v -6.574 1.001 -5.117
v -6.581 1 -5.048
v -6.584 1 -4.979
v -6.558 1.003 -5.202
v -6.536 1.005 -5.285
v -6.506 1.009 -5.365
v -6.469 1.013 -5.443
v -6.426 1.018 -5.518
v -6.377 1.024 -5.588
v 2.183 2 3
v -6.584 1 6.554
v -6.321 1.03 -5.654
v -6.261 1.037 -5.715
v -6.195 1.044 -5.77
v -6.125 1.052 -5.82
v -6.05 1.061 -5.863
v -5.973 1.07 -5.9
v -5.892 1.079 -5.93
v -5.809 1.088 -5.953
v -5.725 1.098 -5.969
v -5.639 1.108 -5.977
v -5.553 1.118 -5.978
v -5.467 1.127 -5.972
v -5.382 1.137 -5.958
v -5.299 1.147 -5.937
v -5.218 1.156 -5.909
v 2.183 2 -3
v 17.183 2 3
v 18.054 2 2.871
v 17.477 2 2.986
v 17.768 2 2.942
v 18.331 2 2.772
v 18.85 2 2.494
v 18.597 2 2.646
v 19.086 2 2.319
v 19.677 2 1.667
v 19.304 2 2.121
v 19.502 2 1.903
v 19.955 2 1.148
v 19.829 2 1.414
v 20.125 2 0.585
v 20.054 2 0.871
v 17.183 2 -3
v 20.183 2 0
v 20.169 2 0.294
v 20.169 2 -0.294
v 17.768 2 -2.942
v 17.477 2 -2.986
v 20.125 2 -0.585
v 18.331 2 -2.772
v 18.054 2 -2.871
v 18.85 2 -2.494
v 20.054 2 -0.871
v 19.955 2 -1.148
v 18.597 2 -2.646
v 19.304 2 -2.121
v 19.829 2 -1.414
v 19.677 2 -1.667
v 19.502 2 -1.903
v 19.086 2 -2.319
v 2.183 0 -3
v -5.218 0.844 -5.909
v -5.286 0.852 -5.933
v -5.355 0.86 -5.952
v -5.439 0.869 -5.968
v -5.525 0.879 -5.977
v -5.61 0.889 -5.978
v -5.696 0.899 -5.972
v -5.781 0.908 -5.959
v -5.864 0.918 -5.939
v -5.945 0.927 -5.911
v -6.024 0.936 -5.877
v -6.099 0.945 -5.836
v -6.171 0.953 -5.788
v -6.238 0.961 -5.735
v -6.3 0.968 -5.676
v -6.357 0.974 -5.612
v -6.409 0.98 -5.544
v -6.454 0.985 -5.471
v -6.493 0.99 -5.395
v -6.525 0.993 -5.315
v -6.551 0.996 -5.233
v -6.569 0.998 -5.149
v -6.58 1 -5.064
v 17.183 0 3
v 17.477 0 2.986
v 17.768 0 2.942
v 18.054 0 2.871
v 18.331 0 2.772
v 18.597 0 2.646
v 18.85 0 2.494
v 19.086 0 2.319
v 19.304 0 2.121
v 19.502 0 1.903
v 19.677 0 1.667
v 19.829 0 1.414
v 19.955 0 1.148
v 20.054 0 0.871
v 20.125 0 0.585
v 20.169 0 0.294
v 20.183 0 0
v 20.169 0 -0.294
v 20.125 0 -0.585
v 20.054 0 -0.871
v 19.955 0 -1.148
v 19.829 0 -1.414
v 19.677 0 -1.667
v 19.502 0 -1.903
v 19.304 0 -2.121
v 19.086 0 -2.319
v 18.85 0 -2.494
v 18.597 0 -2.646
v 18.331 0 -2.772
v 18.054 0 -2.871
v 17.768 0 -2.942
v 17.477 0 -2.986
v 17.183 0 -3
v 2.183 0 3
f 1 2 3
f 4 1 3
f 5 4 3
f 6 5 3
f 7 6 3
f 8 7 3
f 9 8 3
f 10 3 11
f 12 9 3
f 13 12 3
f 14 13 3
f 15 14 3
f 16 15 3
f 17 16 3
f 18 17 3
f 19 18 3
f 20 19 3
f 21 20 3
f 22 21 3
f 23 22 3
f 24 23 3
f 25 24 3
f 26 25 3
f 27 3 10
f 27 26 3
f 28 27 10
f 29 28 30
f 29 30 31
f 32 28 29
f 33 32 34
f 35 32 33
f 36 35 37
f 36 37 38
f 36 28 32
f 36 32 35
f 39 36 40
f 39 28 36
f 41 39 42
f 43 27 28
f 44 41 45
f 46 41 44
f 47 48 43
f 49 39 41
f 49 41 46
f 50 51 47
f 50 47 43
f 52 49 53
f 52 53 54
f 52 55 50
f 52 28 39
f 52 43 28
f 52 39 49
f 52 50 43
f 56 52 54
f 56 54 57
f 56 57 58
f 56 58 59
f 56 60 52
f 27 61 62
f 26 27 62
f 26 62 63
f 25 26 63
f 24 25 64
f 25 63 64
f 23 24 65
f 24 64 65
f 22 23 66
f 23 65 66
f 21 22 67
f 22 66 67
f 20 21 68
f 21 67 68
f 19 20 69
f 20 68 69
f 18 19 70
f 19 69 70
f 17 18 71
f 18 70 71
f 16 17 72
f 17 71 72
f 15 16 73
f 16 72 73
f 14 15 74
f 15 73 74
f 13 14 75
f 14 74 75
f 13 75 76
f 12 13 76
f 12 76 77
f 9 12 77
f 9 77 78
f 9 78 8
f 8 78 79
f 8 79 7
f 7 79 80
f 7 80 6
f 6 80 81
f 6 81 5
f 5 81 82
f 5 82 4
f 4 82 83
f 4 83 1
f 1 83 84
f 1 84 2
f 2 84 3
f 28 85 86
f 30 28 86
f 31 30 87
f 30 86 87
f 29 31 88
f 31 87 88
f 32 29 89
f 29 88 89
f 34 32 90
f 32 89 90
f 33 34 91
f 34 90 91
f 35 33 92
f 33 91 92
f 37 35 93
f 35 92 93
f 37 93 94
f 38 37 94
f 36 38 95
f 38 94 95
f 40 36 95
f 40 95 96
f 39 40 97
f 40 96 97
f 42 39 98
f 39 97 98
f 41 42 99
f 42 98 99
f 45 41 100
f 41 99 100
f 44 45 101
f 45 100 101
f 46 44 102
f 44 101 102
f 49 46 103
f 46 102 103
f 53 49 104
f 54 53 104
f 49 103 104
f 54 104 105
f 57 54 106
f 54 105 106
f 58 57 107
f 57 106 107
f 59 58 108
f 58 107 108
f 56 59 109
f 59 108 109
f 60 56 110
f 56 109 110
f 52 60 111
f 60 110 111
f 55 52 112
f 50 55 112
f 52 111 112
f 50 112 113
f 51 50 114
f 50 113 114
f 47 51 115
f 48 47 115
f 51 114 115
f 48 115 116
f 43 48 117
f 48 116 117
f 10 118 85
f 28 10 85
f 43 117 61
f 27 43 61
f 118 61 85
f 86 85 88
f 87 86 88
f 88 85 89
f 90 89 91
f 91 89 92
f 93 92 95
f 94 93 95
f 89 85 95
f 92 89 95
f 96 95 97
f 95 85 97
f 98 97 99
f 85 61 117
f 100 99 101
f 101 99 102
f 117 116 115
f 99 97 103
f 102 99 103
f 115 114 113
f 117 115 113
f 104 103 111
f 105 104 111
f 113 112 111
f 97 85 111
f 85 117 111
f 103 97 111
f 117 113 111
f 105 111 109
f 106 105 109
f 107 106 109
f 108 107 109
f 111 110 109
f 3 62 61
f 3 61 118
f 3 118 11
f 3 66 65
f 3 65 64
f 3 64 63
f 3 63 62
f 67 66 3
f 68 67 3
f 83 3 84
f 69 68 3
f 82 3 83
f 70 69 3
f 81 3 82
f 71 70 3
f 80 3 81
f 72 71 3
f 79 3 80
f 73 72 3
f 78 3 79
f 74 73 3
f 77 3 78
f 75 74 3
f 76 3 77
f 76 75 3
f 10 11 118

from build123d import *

# Parameters (mm, degrees)
BOSS_EXTRUDE1_DEPTH     = 2
CUT_EXTRUDE1_DEPTH      = 22.314348222
CUT_EXTRUDE1_DEPTH_BACK = 22.314348222
CUT_EXTRUDE2_DEPTH      = 22.314348222
CUT_EXTRUDE2_DEPTH_BACK = 22.314348222


with BuildPart() as part:
    # Sketch1 → Boss-Extrude1 (new body)
    with BuildSketch(Plane(origin=(0, 0, 0), x_dir=(1, 0, 0), z_dir=(0, 1, 0))):
        with BuildLine():
            Line((2.182949987, 3), (-5.217733039, 5.909415386))
            ThreePointArc((-5.217733039, 5.909415386), (-6.146688679, 5.80514872), (-6.583603739, 4.978749694))
            Line((-6.583603739, 4.978749694), (-6.583603739, -6.553622658))
            Line((-6.583603739, -6.553622658), (2.182949987, -3))
            Line((2.182949987, -3), (17.182949987, -3))
            ThreePointArc((17.182949987, -3), (20.182949987, 0), (17.182949987, 3))
            Line((17.182949987, 3), (2.182949987, 3))
        make_face()
    extrude(amount=BOSS_EXTRUDE1_DEPTH)

    # Sketch2 → Cut-Extrude1 (cut, two sides: drawn at the far end of the back side and taken through both)
    with BuildSketch(Plane.XY.offset(-CUT_EXTRUDE1_DEPTH_BACK)):
        Polygon((-6.583603739, 1), (2.182949987, 2), (-6.583603739, 2), align=None)
    extrude(amount=CUT_EXTRUDE1_DEPTH + CUT_EXTRUDE1_DEPTH_BACK, mode=Mode.SUBTRACT)

    # Sketch3 → Cut-Extrude2 (cut, two sides: drawn at the far end of the back side and taken through both)
    with BuildSketch(Plane.XY.offset(-CUT_EXTRUDE2_DEPTH_BACK)):
        Polygon((-6.583603739, 1), (-6.583603739, 0), (2.182949987, 0), align=None)
    extrude(amount=CUT_EXTRUDE2_DEPTH + CUT_EXTRUDE2_DEPTH_BACK, mode=Mode.SUBTRACT)


solid = part.part
